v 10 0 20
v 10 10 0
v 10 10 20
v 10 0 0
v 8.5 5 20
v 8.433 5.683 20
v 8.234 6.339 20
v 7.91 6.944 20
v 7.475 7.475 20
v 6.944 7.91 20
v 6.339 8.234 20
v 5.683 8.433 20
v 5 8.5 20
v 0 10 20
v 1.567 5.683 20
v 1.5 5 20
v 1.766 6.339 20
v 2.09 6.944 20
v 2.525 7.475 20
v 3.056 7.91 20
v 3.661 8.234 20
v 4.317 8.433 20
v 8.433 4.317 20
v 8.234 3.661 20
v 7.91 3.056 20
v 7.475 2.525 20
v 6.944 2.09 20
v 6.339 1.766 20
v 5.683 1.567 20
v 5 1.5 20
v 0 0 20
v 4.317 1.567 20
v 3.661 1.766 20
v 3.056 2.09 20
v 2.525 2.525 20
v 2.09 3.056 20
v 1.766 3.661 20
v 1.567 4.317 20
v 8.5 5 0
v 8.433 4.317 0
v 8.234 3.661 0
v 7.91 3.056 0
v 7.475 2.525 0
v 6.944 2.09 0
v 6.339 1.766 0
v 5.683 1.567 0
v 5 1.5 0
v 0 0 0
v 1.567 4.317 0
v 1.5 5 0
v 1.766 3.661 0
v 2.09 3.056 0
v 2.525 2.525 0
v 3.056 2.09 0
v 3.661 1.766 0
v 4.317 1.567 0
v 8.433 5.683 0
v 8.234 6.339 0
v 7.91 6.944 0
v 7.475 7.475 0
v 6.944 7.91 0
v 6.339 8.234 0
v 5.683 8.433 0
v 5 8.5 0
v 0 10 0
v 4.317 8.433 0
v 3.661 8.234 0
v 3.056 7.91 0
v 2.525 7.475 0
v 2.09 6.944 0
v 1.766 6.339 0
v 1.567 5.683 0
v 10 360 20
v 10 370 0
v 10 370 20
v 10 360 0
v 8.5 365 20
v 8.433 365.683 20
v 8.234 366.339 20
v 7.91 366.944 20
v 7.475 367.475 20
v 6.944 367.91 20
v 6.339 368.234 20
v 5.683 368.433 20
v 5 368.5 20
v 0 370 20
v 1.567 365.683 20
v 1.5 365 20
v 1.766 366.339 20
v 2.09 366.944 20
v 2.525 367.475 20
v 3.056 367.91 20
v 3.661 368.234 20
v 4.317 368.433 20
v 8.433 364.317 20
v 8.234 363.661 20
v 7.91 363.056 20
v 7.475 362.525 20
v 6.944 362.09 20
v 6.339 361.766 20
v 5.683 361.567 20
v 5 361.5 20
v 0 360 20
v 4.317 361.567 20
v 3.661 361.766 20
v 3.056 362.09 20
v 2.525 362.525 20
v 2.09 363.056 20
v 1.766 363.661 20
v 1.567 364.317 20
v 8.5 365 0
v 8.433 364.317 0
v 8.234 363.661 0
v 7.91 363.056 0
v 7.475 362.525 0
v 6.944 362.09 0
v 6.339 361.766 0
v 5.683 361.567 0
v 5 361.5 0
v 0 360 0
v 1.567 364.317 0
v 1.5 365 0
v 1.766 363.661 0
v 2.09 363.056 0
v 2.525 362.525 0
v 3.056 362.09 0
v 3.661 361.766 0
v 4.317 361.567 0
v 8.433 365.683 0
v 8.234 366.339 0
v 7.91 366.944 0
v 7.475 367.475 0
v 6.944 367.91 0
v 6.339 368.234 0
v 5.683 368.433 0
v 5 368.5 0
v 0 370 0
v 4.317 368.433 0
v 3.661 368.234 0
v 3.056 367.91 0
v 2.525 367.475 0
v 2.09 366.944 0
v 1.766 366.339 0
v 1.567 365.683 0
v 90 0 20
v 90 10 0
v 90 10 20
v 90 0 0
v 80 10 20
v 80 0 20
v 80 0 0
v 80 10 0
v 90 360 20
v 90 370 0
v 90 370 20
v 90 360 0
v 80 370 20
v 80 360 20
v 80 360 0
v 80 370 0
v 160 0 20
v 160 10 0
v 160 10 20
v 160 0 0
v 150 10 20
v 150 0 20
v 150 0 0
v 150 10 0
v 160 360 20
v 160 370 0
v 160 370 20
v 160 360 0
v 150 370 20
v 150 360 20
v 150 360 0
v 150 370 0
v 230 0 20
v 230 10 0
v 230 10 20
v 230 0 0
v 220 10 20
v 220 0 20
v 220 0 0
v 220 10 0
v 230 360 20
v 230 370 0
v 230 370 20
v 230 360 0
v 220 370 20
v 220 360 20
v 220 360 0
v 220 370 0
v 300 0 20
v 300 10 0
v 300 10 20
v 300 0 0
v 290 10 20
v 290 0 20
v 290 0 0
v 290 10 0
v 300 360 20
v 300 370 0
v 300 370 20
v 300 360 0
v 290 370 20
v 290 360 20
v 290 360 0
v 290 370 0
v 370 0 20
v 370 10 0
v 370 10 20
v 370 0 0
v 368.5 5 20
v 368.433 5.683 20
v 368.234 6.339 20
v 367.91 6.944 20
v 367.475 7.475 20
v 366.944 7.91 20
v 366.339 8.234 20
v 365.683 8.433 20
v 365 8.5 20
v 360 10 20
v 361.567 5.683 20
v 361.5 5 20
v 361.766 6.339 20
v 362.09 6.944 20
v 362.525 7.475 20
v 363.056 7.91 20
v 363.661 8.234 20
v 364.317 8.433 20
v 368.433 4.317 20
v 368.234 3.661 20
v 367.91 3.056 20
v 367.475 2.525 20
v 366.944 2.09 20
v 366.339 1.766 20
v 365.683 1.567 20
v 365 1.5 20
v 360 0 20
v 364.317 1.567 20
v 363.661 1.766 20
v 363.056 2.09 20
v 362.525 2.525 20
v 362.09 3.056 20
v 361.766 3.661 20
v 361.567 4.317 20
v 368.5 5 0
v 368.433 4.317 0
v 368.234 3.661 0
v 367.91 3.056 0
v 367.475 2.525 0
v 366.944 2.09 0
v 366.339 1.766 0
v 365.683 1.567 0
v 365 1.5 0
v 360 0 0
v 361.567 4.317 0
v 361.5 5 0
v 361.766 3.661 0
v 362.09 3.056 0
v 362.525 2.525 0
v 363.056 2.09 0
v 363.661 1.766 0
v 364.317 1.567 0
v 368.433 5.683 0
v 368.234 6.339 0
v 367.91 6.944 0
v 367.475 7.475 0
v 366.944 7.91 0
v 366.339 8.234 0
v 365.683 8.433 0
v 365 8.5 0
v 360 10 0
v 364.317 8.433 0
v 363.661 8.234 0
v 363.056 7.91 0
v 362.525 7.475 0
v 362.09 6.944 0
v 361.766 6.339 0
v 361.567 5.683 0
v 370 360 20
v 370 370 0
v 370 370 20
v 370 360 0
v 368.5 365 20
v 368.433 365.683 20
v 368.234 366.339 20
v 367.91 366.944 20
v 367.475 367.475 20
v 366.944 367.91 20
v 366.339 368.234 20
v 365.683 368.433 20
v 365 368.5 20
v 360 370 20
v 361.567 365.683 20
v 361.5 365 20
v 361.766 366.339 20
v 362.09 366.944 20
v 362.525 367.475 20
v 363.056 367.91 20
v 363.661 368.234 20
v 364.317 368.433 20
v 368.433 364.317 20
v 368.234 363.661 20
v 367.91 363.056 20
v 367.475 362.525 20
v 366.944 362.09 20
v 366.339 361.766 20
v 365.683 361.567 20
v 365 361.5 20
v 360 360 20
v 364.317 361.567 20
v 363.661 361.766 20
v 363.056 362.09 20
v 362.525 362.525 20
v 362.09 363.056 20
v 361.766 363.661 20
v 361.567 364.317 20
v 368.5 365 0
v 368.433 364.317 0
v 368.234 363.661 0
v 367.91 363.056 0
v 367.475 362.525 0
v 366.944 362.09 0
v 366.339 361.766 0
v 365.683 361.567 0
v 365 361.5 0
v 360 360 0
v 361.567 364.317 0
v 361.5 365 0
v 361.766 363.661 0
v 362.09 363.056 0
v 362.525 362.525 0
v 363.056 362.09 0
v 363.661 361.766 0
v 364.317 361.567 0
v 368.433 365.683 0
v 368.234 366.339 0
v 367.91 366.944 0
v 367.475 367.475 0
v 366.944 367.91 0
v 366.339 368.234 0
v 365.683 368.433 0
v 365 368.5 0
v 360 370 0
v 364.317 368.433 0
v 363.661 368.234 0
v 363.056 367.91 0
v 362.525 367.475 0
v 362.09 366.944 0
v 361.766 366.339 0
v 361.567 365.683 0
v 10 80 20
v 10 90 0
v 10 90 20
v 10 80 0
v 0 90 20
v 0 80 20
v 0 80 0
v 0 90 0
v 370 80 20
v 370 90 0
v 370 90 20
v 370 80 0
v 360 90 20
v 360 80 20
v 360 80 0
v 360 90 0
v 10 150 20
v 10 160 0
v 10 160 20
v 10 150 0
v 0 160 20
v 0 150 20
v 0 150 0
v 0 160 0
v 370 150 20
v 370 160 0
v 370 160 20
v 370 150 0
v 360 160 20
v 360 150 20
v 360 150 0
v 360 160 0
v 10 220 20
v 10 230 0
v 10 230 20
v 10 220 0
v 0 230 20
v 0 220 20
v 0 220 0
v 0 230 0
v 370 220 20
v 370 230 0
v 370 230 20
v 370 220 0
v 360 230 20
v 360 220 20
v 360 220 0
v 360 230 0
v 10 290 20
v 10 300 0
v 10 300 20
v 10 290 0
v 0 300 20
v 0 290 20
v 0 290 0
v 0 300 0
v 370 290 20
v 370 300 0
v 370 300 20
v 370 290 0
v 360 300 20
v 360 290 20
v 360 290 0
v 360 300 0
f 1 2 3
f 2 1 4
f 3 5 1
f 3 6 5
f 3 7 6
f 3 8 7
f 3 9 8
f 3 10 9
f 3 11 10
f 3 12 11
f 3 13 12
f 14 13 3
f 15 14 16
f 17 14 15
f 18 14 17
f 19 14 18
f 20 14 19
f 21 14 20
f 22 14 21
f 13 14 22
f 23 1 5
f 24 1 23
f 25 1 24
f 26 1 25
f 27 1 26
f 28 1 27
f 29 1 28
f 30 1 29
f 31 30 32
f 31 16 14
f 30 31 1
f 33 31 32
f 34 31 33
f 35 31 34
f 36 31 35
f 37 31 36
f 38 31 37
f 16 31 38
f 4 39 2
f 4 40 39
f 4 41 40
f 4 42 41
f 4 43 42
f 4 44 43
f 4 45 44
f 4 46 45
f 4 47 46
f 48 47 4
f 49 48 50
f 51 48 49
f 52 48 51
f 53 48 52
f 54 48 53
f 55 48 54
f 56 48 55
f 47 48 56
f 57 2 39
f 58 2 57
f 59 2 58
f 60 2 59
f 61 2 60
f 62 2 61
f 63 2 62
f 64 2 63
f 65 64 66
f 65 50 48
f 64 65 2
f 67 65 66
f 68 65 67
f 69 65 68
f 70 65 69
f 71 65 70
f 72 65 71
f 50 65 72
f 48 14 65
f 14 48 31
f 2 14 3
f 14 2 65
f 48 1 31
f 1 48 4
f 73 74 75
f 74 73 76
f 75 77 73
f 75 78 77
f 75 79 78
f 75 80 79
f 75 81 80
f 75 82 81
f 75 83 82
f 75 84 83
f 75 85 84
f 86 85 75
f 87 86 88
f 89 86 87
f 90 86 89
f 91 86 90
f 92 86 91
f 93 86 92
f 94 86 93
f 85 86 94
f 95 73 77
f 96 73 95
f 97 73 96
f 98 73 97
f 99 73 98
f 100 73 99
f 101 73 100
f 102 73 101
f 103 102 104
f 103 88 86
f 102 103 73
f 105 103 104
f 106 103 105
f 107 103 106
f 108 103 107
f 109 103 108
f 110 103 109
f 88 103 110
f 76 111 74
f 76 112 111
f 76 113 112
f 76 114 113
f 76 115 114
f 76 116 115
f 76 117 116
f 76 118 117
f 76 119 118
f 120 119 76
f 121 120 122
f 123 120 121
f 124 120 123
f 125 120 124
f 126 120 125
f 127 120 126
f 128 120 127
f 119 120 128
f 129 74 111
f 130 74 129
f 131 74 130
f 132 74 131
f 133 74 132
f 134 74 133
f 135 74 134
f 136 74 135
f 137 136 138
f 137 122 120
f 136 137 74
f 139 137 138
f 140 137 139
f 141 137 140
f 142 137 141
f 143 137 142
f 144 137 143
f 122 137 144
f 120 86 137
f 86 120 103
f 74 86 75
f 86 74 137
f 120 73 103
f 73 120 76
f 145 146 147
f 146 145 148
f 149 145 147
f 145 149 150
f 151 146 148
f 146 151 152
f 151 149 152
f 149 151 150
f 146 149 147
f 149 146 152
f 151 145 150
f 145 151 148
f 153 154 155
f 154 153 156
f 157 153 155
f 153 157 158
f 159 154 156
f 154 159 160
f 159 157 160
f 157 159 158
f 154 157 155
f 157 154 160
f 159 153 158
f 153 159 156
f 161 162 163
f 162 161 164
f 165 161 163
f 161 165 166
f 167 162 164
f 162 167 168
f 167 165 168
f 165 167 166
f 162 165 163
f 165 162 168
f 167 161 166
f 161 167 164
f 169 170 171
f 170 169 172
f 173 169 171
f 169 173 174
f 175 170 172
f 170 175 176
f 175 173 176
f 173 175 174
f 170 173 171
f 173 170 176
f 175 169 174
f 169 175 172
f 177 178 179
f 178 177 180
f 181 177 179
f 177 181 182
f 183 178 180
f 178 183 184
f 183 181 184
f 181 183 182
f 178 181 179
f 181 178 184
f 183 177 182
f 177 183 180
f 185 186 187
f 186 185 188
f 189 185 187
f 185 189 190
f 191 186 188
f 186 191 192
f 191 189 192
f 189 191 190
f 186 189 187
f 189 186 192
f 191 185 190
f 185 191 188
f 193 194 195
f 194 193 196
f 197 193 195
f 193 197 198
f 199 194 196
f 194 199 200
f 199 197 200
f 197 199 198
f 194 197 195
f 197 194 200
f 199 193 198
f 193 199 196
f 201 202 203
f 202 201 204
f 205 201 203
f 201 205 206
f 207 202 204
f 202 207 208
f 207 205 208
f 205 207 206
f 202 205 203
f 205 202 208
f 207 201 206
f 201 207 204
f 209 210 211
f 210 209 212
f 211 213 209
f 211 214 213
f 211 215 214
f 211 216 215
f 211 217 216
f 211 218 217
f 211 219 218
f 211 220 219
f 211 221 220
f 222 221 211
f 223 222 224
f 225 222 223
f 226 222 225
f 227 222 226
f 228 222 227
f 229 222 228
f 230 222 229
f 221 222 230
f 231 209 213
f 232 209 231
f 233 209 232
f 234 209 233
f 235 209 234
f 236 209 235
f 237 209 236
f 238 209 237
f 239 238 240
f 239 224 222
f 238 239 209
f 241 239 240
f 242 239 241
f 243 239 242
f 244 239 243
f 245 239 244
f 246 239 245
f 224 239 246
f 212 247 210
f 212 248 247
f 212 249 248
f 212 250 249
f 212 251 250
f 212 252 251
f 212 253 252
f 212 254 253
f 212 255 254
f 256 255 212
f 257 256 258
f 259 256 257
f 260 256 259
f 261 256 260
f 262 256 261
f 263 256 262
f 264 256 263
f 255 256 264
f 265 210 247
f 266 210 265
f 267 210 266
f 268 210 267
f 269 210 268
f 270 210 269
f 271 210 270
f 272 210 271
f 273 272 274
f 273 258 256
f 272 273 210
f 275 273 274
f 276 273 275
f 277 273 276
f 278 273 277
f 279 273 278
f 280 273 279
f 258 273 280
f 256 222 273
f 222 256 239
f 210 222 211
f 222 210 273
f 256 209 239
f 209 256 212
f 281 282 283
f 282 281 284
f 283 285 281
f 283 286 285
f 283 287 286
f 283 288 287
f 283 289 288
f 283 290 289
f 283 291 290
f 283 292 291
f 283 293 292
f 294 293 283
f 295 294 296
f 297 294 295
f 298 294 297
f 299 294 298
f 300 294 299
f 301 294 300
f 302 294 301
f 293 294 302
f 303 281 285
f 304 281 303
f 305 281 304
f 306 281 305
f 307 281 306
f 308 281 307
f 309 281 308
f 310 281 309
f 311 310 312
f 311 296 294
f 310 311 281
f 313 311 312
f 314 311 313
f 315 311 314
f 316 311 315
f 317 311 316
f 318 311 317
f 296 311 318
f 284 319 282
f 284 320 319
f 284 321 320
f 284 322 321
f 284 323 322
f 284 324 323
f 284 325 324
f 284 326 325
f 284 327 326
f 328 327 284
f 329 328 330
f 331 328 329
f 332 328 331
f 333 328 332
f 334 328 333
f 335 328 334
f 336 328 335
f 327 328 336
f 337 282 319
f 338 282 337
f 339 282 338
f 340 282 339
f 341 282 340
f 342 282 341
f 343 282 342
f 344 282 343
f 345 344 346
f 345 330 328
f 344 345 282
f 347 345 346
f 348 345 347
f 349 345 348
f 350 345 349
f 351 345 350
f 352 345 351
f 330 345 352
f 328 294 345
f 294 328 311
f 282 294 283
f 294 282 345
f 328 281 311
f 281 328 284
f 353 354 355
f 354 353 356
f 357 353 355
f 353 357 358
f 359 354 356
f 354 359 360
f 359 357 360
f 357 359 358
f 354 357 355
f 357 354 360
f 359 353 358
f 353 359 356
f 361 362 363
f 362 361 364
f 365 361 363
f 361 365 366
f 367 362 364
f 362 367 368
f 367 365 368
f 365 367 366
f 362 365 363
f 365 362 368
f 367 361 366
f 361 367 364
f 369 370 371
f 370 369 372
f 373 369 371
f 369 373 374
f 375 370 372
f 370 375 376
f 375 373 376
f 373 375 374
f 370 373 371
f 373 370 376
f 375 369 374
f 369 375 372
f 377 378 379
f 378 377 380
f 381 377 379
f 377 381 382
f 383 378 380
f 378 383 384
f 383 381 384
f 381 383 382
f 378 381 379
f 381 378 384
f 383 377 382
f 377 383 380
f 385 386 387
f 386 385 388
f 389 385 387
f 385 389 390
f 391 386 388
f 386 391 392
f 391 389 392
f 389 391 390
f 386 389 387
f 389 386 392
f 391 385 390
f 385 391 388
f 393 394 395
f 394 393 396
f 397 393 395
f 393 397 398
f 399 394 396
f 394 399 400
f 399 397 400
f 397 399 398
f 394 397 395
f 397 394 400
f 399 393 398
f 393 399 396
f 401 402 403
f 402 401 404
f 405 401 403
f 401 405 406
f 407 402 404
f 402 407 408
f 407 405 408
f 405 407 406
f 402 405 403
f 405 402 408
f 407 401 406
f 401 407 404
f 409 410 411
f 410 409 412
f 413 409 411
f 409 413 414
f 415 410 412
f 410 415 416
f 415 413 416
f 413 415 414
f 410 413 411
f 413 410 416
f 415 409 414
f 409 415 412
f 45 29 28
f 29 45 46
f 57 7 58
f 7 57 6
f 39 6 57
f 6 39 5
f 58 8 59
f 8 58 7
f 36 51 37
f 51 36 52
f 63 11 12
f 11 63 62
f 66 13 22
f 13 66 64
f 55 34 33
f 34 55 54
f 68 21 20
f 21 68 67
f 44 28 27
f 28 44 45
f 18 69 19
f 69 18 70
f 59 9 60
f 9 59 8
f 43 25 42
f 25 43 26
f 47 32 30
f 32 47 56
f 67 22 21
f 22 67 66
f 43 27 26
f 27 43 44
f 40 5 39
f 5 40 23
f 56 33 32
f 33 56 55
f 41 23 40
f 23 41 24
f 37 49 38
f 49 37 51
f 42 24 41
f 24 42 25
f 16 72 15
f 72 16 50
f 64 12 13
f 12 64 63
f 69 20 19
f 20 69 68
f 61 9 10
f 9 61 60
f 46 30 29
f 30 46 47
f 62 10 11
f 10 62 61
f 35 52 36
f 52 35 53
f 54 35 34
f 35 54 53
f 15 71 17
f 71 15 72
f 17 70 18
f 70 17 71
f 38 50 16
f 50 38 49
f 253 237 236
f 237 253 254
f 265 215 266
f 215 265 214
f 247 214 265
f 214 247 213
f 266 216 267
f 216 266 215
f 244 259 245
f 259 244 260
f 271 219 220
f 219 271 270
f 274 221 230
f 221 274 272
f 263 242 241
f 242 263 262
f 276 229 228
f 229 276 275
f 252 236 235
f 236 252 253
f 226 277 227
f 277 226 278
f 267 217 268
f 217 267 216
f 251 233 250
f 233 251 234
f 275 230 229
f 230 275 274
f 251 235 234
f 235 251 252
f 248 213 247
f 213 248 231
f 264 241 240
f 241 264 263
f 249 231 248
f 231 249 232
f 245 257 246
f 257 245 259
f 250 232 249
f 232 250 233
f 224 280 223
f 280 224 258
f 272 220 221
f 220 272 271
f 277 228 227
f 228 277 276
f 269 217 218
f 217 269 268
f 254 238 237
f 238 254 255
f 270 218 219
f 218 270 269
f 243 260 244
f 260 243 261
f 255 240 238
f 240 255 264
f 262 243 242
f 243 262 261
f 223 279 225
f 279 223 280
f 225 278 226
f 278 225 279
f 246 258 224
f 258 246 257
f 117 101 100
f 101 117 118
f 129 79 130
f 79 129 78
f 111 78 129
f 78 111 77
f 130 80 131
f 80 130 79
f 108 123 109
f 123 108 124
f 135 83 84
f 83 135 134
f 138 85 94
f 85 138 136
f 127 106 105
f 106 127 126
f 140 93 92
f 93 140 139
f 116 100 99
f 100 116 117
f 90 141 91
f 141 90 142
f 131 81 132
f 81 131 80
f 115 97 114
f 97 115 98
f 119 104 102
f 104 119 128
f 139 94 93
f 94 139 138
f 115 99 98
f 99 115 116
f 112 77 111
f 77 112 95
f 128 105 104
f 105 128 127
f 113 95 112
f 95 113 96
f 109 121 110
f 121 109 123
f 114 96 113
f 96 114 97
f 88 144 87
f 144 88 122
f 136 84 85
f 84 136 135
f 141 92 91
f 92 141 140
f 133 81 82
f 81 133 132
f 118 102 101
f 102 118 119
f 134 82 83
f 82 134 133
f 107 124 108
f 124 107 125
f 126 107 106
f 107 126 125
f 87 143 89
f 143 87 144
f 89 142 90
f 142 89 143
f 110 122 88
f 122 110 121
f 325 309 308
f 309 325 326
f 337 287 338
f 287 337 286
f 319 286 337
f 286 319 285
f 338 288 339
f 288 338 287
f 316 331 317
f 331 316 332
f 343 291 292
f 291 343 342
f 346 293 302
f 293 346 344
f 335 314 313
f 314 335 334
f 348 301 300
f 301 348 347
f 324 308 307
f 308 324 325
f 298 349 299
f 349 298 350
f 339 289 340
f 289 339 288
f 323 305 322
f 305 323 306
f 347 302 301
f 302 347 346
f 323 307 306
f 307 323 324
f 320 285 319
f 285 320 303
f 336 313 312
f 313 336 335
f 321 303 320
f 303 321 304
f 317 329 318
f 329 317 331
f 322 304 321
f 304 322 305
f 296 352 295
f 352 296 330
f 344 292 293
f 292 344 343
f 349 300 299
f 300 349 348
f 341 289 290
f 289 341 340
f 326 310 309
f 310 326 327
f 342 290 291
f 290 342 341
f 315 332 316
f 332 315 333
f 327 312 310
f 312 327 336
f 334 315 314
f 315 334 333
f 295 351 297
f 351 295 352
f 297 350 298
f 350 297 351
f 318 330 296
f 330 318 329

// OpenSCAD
bar=10;ext=370;v_bar_h=20;m6_d=7;positions=[0,80,150,220,290,360];difference(){union(){for(x=positions){translate([x,0,0])cube([bar,bar,v_bar_h]);translate([x,360,0])cube([bar,bar,v_bar_h]);}for(y=positions){if(y!=0&&y!=360){translate([0,y,0])cube([bar,bar,v_bar_h]);translate([360,y,0])cube([bar,bar,v_bar_h]);}}}translate([5,5,-1])cylinder(h=100,d=m6_d,$fn=32);translate([365,5,-1])cylinder(h=100,d=m6_d,$fn=32);translate([5,365,-1])cylinder(h=100,d=m6_d,$fn=32);translate([365,365,-1])cylinder(h=100,d=m6_d,$fn=32);}
